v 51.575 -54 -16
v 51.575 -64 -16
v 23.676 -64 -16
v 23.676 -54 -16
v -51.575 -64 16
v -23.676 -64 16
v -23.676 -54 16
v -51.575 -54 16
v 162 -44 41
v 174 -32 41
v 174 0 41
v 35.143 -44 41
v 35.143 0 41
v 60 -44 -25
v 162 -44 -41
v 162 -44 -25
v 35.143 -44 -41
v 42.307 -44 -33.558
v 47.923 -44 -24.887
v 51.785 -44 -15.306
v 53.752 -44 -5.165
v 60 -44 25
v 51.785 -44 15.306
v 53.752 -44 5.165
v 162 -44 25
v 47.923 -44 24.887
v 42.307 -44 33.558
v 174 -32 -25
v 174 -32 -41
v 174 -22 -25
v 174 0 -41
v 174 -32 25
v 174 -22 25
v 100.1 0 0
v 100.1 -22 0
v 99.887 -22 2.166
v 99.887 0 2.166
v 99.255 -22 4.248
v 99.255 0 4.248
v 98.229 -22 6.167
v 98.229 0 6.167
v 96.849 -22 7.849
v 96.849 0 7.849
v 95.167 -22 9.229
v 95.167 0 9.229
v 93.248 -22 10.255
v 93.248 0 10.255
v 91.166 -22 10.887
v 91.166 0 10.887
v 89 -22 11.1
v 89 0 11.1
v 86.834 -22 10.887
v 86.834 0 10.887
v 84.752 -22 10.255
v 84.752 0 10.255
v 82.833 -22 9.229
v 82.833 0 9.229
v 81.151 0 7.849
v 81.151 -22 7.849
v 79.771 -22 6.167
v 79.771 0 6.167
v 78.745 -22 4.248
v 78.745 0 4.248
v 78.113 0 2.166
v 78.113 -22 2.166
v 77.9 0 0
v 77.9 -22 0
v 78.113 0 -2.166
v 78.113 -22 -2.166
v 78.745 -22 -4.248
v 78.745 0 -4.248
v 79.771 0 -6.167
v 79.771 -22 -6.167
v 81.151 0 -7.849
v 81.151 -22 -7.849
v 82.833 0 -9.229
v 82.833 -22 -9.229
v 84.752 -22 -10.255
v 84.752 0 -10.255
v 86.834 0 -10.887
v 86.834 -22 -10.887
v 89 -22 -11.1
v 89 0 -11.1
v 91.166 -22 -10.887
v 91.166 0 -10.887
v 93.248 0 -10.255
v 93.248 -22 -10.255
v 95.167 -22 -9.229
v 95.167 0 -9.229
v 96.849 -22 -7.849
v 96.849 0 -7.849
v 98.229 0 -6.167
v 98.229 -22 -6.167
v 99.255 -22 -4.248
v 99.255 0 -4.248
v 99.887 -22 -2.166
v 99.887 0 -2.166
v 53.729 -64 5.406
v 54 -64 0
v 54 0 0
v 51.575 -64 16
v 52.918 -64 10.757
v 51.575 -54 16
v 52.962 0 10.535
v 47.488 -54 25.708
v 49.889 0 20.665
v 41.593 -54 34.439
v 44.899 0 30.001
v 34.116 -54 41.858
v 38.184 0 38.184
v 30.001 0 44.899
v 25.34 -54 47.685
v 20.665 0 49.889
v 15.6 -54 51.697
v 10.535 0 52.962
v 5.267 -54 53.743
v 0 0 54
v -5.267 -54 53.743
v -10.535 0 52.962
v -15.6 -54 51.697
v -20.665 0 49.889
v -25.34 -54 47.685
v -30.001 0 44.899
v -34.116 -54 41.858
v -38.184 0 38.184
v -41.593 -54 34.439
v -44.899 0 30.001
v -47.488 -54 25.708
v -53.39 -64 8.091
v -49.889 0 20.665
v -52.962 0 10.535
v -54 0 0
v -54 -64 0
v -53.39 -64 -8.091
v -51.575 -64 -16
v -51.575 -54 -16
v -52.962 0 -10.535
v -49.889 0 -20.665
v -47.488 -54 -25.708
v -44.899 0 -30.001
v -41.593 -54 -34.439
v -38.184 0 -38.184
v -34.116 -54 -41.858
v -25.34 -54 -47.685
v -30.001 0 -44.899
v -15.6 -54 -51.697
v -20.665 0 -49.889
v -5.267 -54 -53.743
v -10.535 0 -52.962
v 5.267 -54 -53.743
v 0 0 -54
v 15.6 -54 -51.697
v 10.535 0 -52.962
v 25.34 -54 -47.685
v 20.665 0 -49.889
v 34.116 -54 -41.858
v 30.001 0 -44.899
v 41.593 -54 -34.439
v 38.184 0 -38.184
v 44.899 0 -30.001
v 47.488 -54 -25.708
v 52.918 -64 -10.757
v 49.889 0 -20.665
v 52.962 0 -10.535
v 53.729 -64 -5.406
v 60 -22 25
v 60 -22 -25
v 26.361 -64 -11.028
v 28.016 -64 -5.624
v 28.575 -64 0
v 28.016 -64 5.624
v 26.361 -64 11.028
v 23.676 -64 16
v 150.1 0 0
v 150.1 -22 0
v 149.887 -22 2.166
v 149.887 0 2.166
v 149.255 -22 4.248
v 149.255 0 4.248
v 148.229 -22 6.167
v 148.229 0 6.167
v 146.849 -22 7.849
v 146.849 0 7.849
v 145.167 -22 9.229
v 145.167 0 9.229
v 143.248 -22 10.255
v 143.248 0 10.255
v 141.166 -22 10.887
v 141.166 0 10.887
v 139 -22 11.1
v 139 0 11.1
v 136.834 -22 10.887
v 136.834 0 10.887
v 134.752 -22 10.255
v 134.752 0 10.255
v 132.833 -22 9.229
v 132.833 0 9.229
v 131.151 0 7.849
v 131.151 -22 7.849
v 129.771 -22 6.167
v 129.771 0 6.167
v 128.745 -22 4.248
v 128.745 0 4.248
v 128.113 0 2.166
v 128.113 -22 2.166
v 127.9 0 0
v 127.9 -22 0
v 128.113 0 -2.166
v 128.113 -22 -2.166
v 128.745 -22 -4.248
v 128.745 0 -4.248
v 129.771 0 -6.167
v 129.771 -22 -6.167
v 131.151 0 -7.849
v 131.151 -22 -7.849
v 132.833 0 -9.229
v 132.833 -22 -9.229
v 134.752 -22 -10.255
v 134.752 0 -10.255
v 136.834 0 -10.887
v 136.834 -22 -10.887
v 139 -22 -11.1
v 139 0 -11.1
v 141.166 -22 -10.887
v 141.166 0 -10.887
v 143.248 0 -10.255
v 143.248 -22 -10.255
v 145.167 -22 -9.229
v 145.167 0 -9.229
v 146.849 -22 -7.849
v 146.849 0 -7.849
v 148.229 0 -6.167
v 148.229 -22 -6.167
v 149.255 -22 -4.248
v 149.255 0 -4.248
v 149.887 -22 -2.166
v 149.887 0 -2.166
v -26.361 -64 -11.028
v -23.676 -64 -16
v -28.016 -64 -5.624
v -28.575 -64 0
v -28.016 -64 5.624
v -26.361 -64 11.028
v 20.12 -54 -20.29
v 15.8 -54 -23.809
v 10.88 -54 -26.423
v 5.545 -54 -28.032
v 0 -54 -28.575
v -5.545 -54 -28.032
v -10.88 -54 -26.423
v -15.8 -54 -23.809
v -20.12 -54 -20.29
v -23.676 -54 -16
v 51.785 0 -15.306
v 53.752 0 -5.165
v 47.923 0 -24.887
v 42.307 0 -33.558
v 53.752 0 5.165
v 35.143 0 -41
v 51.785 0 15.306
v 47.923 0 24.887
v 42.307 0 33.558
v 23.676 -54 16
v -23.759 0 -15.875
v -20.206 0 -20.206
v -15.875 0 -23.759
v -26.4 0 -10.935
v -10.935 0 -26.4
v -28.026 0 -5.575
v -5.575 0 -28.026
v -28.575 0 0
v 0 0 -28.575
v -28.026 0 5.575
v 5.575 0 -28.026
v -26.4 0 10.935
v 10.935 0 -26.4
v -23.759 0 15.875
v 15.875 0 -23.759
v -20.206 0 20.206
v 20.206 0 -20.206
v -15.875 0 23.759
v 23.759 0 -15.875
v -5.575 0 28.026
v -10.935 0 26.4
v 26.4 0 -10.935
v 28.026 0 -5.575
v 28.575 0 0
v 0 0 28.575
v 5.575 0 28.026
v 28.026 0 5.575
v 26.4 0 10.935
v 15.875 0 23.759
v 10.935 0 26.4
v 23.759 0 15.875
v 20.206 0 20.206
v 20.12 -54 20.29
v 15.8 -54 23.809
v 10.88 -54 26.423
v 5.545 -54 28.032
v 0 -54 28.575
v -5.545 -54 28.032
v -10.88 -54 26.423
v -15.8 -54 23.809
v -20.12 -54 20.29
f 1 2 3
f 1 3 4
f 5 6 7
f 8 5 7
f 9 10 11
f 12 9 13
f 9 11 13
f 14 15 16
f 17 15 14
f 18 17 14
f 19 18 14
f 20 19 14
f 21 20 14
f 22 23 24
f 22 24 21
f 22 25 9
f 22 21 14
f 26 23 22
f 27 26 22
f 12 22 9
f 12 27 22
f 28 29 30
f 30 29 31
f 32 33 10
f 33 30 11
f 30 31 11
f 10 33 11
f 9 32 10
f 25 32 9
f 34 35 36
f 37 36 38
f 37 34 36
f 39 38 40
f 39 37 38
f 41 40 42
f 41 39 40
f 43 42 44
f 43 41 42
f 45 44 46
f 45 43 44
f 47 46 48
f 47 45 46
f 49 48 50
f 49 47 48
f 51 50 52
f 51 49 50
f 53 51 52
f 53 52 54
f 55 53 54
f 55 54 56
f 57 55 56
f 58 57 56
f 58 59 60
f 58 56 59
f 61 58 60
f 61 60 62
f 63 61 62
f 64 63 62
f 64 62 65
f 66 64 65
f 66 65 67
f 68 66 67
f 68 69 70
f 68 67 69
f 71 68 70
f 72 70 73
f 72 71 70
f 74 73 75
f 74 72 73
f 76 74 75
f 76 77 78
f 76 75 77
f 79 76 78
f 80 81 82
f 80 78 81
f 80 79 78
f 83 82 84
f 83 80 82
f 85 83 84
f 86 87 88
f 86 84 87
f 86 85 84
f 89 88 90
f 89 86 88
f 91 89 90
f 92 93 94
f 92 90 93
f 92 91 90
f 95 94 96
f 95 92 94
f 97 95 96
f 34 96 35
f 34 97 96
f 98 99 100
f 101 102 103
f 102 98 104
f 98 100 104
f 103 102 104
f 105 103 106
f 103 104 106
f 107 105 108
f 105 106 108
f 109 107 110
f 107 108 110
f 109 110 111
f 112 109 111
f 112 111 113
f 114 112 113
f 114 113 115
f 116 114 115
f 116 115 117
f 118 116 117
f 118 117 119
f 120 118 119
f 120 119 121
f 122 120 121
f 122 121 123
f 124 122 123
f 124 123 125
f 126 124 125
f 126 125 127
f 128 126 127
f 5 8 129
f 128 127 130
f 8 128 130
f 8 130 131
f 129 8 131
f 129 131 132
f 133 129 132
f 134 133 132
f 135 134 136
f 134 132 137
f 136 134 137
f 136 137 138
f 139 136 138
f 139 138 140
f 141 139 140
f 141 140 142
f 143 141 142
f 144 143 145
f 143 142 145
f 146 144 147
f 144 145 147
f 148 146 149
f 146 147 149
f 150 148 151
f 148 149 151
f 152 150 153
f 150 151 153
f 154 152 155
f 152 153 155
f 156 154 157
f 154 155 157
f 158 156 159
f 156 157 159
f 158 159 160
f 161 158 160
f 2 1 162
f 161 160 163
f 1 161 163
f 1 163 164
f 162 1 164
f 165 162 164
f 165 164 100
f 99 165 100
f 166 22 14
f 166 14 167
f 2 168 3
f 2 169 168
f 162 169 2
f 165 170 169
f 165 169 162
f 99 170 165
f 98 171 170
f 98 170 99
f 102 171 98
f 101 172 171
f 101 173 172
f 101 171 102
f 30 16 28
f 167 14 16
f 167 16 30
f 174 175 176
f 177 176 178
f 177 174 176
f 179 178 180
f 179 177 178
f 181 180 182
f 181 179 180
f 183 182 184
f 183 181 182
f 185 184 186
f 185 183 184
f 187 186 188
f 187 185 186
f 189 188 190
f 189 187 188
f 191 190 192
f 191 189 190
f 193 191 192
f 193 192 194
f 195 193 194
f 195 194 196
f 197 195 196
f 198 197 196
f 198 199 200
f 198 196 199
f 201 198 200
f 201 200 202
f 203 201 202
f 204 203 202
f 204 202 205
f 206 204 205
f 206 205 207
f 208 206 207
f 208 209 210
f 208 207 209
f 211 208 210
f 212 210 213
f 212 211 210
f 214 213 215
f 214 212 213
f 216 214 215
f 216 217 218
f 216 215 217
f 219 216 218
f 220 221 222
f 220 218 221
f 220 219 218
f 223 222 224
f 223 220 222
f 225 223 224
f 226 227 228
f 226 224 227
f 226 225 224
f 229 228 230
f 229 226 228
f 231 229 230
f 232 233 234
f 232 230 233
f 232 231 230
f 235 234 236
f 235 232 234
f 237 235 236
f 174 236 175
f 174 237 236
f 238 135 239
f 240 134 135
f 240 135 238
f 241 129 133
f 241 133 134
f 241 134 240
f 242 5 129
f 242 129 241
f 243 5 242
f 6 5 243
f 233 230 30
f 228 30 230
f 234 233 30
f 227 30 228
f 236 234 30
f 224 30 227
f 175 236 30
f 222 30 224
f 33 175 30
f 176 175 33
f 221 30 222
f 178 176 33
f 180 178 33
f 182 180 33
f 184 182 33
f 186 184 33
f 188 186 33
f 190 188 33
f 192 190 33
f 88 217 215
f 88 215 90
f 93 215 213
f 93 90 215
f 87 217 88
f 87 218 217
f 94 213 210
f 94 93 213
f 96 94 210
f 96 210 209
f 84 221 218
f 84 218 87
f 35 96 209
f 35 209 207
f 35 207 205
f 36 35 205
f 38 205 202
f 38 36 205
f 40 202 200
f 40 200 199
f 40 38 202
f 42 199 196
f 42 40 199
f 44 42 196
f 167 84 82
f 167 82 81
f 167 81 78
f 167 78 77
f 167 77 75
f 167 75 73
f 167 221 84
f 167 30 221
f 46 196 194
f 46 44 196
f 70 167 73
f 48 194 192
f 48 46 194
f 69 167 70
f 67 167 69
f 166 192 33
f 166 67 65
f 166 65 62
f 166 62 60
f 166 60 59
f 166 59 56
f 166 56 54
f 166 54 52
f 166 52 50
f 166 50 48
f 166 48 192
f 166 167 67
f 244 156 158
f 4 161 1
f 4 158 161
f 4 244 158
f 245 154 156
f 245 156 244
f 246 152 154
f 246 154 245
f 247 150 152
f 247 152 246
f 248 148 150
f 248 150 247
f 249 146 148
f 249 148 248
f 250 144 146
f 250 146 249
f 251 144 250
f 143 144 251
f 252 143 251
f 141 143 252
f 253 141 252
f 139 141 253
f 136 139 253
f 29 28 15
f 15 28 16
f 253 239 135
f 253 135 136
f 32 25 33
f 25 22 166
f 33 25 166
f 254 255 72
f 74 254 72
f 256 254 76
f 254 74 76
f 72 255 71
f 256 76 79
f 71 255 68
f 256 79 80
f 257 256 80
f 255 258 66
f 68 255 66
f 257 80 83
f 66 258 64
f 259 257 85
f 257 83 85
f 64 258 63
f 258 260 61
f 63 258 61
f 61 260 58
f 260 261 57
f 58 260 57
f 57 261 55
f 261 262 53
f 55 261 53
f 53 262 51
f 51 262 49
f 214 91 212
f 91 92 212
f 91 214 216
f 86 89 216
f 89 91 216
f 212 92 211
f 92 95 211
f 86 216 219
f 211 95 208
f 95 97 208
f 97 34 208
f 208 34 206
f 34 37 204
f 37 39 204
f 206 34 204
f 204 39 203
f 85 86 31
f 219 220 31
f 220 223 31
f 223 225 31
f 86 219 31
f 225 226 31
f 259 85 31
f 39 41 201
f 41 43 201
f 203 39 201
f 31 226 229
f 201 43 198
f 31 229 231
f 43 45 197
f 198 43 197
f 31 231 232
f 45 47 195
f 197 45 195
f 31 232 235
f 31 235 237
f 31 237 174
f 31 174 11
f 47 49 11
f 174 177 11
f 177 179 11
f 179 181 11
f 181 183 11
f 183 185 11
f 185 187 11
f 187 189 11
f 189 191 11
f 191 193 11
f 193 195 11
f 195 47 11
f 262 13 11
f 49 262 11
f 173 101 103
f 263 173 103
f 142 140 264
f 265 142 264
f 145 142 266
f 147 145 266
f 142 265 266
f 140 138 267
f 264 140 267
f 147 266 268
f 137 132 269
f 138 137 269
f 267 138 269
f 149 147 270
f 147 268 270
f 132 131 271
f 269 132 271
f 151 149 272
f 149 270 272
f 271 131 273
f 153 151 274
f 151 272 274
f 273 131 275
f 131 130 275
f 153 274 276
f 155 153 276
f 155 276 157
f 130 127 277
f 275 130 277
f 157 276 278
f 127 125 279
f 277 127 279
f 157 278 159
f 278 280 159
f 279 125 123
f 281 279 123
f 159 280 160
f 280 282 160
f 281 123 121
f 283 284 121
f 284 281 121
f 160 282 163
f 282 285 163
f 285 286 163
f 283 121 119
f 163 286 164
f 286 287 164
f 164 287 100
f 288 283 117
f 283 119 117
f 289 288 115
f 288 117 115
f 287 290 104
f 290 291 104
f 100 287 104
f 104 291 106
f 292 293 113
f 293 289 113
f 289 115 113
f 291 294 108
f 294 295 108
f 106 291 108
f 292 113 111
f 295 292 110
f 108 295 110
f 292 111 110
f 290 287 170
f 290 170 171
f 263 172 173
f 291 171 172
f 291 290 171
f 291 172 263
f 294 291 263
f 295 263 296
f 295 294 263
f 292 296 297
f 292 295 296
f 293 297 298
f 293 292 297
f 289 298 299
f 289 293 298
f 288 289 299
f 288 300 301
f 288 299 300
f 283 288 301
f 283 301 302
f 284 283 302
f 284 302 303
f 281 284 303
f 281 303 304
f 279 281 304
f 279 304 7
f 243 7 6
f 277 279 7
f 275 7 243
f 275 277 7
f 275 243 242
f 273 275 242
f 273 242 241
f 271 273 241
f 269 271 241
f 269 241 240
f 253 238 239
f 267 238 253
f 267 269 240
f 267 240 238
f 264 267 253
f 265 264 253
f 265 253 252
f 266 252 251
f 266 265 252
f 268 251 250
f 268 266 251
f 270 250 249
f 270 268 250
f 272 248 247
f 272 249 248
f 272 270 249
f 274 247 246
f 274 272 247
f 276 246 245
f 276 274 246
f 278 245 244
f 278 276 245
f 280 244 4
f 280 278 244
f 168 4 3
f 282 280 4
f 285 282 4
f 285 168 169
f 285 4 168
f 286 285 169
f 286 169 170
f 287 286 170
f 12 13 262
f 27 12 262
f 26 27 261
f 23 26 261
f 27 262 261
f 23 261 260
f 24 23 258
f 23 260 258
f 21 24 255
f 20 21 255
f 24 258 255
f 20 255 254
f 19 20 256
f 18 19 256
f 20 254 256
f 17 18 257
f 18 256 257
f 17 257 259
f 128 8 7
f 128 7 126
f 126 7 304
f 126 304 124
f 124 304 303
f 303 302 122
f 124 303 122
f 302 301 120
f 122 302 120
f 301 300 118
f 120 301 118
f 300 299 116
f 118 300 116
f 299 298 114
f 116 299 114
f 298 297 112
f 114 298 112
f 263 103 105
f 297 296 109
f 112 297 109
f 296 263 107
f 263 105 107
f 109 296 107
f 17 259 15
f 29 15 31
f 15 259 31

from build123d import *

# Parameters (mm, degrees)
F0_R           = 54
F0_R_2         = 28.575
F1_DEPTH       = 64
F2_R           = 11.1
F3_DEPTH       = 64
F4_W           = 20
F4_H           = 82
F5_DEPTH       = 174.001
F6_W           = 10
F6_H           = 39.3963404596
F7_DEPTH       = 54.001
F7_DEPTH_BACK  = 174.001
F9_START       = 60
F8_W           = 22
F8_H           = 50
F9_DEPTH       = 114
F11_DEPTH      = 54.001
F11_DEPTH_BACK = 54.001


with BuildPart() as f1:
    # F0 (on Front) → F1 (new body)
    with BuildSketch(Plane.XZ):
        Circle(F0_R)
        Circle(F0_R_2, mode=Mode.SUBTRACT)
    extrude(amount=F1_DEPTH)

    # F6 (on Right) → F7 (cut, two sides)
    with BuildSketch(Plane.YZ) as f7_sk:
        Polygon((-64.0240318326, 54.6036595404), (-64, 16), (-54, 16), (-54, 54.6036595404), align=None)
        with Locations((-59, -35.6981702298)):
            Rectangle(F6_W, F6_H)
    extrude(amount=-F7_DEPTH, mode=Mode.SUBTRACT)
    extrude(f7_sk.sketch, amount=F7_DEPTH_BACK, mode=Mode.SUBTRACT)


with BuildPart() as f3:
    # F2 (on Front) → F3 (new body)
    with BuildSketch(Plane.XZ):
        with BuildLine():
            Line((174, 41), (35.1425667816, 41))
            ThreePointArc((35.1425667816, 41), (54, 0), (35.1425667816, -41))
            Line((35.1425667816, -41), (174, -41))
            Line((174, -41), (174, 41))
        make_face()
        with Locations((89, 0)):
            Circle(F2_R, mode=Mode.SUBTRACT)
        with Locations((139, 0)):
            Circle(F2_R, mode=Mode.SUBTRACT)
    extrude(amount=F3_DEPTH)

    # F4 (on Right) → F5 (cut, through all)
    with BuildSketch(Plane.YZ):
        with Locations((-54, 0)):
            Rectangle(F4_W, F4_H)
    extrude(amount=F5_DEPTH, mode=Mode.SUBTRACT)

    # F8 (on Right) → F9 (cut)
    with BuildSketch(Plane.YZ.offset(F9_START)):
        with Locations((-33, 0)):
            Rectangle(F8_W, F8_H)
    extrude(amount=F9_DEPTH, mode=Mode.SUBTRACT)

    # F10 (on Top) → F11 (cut, two sides)
    with BuildSketch(Plane.XY) as f11_sk:
        Polygon((162, -44), (174, -44), (174, -32), align=None)
    extrude(amount=F11_DEPTH, mode=Mode.SUBTRACT)
    extrude(f11_sk.sketch, amount=-F11_DEPTH_BACK, mode=Mode.SUBTRACT)


solid = Compound([f1.part, f3.part])
